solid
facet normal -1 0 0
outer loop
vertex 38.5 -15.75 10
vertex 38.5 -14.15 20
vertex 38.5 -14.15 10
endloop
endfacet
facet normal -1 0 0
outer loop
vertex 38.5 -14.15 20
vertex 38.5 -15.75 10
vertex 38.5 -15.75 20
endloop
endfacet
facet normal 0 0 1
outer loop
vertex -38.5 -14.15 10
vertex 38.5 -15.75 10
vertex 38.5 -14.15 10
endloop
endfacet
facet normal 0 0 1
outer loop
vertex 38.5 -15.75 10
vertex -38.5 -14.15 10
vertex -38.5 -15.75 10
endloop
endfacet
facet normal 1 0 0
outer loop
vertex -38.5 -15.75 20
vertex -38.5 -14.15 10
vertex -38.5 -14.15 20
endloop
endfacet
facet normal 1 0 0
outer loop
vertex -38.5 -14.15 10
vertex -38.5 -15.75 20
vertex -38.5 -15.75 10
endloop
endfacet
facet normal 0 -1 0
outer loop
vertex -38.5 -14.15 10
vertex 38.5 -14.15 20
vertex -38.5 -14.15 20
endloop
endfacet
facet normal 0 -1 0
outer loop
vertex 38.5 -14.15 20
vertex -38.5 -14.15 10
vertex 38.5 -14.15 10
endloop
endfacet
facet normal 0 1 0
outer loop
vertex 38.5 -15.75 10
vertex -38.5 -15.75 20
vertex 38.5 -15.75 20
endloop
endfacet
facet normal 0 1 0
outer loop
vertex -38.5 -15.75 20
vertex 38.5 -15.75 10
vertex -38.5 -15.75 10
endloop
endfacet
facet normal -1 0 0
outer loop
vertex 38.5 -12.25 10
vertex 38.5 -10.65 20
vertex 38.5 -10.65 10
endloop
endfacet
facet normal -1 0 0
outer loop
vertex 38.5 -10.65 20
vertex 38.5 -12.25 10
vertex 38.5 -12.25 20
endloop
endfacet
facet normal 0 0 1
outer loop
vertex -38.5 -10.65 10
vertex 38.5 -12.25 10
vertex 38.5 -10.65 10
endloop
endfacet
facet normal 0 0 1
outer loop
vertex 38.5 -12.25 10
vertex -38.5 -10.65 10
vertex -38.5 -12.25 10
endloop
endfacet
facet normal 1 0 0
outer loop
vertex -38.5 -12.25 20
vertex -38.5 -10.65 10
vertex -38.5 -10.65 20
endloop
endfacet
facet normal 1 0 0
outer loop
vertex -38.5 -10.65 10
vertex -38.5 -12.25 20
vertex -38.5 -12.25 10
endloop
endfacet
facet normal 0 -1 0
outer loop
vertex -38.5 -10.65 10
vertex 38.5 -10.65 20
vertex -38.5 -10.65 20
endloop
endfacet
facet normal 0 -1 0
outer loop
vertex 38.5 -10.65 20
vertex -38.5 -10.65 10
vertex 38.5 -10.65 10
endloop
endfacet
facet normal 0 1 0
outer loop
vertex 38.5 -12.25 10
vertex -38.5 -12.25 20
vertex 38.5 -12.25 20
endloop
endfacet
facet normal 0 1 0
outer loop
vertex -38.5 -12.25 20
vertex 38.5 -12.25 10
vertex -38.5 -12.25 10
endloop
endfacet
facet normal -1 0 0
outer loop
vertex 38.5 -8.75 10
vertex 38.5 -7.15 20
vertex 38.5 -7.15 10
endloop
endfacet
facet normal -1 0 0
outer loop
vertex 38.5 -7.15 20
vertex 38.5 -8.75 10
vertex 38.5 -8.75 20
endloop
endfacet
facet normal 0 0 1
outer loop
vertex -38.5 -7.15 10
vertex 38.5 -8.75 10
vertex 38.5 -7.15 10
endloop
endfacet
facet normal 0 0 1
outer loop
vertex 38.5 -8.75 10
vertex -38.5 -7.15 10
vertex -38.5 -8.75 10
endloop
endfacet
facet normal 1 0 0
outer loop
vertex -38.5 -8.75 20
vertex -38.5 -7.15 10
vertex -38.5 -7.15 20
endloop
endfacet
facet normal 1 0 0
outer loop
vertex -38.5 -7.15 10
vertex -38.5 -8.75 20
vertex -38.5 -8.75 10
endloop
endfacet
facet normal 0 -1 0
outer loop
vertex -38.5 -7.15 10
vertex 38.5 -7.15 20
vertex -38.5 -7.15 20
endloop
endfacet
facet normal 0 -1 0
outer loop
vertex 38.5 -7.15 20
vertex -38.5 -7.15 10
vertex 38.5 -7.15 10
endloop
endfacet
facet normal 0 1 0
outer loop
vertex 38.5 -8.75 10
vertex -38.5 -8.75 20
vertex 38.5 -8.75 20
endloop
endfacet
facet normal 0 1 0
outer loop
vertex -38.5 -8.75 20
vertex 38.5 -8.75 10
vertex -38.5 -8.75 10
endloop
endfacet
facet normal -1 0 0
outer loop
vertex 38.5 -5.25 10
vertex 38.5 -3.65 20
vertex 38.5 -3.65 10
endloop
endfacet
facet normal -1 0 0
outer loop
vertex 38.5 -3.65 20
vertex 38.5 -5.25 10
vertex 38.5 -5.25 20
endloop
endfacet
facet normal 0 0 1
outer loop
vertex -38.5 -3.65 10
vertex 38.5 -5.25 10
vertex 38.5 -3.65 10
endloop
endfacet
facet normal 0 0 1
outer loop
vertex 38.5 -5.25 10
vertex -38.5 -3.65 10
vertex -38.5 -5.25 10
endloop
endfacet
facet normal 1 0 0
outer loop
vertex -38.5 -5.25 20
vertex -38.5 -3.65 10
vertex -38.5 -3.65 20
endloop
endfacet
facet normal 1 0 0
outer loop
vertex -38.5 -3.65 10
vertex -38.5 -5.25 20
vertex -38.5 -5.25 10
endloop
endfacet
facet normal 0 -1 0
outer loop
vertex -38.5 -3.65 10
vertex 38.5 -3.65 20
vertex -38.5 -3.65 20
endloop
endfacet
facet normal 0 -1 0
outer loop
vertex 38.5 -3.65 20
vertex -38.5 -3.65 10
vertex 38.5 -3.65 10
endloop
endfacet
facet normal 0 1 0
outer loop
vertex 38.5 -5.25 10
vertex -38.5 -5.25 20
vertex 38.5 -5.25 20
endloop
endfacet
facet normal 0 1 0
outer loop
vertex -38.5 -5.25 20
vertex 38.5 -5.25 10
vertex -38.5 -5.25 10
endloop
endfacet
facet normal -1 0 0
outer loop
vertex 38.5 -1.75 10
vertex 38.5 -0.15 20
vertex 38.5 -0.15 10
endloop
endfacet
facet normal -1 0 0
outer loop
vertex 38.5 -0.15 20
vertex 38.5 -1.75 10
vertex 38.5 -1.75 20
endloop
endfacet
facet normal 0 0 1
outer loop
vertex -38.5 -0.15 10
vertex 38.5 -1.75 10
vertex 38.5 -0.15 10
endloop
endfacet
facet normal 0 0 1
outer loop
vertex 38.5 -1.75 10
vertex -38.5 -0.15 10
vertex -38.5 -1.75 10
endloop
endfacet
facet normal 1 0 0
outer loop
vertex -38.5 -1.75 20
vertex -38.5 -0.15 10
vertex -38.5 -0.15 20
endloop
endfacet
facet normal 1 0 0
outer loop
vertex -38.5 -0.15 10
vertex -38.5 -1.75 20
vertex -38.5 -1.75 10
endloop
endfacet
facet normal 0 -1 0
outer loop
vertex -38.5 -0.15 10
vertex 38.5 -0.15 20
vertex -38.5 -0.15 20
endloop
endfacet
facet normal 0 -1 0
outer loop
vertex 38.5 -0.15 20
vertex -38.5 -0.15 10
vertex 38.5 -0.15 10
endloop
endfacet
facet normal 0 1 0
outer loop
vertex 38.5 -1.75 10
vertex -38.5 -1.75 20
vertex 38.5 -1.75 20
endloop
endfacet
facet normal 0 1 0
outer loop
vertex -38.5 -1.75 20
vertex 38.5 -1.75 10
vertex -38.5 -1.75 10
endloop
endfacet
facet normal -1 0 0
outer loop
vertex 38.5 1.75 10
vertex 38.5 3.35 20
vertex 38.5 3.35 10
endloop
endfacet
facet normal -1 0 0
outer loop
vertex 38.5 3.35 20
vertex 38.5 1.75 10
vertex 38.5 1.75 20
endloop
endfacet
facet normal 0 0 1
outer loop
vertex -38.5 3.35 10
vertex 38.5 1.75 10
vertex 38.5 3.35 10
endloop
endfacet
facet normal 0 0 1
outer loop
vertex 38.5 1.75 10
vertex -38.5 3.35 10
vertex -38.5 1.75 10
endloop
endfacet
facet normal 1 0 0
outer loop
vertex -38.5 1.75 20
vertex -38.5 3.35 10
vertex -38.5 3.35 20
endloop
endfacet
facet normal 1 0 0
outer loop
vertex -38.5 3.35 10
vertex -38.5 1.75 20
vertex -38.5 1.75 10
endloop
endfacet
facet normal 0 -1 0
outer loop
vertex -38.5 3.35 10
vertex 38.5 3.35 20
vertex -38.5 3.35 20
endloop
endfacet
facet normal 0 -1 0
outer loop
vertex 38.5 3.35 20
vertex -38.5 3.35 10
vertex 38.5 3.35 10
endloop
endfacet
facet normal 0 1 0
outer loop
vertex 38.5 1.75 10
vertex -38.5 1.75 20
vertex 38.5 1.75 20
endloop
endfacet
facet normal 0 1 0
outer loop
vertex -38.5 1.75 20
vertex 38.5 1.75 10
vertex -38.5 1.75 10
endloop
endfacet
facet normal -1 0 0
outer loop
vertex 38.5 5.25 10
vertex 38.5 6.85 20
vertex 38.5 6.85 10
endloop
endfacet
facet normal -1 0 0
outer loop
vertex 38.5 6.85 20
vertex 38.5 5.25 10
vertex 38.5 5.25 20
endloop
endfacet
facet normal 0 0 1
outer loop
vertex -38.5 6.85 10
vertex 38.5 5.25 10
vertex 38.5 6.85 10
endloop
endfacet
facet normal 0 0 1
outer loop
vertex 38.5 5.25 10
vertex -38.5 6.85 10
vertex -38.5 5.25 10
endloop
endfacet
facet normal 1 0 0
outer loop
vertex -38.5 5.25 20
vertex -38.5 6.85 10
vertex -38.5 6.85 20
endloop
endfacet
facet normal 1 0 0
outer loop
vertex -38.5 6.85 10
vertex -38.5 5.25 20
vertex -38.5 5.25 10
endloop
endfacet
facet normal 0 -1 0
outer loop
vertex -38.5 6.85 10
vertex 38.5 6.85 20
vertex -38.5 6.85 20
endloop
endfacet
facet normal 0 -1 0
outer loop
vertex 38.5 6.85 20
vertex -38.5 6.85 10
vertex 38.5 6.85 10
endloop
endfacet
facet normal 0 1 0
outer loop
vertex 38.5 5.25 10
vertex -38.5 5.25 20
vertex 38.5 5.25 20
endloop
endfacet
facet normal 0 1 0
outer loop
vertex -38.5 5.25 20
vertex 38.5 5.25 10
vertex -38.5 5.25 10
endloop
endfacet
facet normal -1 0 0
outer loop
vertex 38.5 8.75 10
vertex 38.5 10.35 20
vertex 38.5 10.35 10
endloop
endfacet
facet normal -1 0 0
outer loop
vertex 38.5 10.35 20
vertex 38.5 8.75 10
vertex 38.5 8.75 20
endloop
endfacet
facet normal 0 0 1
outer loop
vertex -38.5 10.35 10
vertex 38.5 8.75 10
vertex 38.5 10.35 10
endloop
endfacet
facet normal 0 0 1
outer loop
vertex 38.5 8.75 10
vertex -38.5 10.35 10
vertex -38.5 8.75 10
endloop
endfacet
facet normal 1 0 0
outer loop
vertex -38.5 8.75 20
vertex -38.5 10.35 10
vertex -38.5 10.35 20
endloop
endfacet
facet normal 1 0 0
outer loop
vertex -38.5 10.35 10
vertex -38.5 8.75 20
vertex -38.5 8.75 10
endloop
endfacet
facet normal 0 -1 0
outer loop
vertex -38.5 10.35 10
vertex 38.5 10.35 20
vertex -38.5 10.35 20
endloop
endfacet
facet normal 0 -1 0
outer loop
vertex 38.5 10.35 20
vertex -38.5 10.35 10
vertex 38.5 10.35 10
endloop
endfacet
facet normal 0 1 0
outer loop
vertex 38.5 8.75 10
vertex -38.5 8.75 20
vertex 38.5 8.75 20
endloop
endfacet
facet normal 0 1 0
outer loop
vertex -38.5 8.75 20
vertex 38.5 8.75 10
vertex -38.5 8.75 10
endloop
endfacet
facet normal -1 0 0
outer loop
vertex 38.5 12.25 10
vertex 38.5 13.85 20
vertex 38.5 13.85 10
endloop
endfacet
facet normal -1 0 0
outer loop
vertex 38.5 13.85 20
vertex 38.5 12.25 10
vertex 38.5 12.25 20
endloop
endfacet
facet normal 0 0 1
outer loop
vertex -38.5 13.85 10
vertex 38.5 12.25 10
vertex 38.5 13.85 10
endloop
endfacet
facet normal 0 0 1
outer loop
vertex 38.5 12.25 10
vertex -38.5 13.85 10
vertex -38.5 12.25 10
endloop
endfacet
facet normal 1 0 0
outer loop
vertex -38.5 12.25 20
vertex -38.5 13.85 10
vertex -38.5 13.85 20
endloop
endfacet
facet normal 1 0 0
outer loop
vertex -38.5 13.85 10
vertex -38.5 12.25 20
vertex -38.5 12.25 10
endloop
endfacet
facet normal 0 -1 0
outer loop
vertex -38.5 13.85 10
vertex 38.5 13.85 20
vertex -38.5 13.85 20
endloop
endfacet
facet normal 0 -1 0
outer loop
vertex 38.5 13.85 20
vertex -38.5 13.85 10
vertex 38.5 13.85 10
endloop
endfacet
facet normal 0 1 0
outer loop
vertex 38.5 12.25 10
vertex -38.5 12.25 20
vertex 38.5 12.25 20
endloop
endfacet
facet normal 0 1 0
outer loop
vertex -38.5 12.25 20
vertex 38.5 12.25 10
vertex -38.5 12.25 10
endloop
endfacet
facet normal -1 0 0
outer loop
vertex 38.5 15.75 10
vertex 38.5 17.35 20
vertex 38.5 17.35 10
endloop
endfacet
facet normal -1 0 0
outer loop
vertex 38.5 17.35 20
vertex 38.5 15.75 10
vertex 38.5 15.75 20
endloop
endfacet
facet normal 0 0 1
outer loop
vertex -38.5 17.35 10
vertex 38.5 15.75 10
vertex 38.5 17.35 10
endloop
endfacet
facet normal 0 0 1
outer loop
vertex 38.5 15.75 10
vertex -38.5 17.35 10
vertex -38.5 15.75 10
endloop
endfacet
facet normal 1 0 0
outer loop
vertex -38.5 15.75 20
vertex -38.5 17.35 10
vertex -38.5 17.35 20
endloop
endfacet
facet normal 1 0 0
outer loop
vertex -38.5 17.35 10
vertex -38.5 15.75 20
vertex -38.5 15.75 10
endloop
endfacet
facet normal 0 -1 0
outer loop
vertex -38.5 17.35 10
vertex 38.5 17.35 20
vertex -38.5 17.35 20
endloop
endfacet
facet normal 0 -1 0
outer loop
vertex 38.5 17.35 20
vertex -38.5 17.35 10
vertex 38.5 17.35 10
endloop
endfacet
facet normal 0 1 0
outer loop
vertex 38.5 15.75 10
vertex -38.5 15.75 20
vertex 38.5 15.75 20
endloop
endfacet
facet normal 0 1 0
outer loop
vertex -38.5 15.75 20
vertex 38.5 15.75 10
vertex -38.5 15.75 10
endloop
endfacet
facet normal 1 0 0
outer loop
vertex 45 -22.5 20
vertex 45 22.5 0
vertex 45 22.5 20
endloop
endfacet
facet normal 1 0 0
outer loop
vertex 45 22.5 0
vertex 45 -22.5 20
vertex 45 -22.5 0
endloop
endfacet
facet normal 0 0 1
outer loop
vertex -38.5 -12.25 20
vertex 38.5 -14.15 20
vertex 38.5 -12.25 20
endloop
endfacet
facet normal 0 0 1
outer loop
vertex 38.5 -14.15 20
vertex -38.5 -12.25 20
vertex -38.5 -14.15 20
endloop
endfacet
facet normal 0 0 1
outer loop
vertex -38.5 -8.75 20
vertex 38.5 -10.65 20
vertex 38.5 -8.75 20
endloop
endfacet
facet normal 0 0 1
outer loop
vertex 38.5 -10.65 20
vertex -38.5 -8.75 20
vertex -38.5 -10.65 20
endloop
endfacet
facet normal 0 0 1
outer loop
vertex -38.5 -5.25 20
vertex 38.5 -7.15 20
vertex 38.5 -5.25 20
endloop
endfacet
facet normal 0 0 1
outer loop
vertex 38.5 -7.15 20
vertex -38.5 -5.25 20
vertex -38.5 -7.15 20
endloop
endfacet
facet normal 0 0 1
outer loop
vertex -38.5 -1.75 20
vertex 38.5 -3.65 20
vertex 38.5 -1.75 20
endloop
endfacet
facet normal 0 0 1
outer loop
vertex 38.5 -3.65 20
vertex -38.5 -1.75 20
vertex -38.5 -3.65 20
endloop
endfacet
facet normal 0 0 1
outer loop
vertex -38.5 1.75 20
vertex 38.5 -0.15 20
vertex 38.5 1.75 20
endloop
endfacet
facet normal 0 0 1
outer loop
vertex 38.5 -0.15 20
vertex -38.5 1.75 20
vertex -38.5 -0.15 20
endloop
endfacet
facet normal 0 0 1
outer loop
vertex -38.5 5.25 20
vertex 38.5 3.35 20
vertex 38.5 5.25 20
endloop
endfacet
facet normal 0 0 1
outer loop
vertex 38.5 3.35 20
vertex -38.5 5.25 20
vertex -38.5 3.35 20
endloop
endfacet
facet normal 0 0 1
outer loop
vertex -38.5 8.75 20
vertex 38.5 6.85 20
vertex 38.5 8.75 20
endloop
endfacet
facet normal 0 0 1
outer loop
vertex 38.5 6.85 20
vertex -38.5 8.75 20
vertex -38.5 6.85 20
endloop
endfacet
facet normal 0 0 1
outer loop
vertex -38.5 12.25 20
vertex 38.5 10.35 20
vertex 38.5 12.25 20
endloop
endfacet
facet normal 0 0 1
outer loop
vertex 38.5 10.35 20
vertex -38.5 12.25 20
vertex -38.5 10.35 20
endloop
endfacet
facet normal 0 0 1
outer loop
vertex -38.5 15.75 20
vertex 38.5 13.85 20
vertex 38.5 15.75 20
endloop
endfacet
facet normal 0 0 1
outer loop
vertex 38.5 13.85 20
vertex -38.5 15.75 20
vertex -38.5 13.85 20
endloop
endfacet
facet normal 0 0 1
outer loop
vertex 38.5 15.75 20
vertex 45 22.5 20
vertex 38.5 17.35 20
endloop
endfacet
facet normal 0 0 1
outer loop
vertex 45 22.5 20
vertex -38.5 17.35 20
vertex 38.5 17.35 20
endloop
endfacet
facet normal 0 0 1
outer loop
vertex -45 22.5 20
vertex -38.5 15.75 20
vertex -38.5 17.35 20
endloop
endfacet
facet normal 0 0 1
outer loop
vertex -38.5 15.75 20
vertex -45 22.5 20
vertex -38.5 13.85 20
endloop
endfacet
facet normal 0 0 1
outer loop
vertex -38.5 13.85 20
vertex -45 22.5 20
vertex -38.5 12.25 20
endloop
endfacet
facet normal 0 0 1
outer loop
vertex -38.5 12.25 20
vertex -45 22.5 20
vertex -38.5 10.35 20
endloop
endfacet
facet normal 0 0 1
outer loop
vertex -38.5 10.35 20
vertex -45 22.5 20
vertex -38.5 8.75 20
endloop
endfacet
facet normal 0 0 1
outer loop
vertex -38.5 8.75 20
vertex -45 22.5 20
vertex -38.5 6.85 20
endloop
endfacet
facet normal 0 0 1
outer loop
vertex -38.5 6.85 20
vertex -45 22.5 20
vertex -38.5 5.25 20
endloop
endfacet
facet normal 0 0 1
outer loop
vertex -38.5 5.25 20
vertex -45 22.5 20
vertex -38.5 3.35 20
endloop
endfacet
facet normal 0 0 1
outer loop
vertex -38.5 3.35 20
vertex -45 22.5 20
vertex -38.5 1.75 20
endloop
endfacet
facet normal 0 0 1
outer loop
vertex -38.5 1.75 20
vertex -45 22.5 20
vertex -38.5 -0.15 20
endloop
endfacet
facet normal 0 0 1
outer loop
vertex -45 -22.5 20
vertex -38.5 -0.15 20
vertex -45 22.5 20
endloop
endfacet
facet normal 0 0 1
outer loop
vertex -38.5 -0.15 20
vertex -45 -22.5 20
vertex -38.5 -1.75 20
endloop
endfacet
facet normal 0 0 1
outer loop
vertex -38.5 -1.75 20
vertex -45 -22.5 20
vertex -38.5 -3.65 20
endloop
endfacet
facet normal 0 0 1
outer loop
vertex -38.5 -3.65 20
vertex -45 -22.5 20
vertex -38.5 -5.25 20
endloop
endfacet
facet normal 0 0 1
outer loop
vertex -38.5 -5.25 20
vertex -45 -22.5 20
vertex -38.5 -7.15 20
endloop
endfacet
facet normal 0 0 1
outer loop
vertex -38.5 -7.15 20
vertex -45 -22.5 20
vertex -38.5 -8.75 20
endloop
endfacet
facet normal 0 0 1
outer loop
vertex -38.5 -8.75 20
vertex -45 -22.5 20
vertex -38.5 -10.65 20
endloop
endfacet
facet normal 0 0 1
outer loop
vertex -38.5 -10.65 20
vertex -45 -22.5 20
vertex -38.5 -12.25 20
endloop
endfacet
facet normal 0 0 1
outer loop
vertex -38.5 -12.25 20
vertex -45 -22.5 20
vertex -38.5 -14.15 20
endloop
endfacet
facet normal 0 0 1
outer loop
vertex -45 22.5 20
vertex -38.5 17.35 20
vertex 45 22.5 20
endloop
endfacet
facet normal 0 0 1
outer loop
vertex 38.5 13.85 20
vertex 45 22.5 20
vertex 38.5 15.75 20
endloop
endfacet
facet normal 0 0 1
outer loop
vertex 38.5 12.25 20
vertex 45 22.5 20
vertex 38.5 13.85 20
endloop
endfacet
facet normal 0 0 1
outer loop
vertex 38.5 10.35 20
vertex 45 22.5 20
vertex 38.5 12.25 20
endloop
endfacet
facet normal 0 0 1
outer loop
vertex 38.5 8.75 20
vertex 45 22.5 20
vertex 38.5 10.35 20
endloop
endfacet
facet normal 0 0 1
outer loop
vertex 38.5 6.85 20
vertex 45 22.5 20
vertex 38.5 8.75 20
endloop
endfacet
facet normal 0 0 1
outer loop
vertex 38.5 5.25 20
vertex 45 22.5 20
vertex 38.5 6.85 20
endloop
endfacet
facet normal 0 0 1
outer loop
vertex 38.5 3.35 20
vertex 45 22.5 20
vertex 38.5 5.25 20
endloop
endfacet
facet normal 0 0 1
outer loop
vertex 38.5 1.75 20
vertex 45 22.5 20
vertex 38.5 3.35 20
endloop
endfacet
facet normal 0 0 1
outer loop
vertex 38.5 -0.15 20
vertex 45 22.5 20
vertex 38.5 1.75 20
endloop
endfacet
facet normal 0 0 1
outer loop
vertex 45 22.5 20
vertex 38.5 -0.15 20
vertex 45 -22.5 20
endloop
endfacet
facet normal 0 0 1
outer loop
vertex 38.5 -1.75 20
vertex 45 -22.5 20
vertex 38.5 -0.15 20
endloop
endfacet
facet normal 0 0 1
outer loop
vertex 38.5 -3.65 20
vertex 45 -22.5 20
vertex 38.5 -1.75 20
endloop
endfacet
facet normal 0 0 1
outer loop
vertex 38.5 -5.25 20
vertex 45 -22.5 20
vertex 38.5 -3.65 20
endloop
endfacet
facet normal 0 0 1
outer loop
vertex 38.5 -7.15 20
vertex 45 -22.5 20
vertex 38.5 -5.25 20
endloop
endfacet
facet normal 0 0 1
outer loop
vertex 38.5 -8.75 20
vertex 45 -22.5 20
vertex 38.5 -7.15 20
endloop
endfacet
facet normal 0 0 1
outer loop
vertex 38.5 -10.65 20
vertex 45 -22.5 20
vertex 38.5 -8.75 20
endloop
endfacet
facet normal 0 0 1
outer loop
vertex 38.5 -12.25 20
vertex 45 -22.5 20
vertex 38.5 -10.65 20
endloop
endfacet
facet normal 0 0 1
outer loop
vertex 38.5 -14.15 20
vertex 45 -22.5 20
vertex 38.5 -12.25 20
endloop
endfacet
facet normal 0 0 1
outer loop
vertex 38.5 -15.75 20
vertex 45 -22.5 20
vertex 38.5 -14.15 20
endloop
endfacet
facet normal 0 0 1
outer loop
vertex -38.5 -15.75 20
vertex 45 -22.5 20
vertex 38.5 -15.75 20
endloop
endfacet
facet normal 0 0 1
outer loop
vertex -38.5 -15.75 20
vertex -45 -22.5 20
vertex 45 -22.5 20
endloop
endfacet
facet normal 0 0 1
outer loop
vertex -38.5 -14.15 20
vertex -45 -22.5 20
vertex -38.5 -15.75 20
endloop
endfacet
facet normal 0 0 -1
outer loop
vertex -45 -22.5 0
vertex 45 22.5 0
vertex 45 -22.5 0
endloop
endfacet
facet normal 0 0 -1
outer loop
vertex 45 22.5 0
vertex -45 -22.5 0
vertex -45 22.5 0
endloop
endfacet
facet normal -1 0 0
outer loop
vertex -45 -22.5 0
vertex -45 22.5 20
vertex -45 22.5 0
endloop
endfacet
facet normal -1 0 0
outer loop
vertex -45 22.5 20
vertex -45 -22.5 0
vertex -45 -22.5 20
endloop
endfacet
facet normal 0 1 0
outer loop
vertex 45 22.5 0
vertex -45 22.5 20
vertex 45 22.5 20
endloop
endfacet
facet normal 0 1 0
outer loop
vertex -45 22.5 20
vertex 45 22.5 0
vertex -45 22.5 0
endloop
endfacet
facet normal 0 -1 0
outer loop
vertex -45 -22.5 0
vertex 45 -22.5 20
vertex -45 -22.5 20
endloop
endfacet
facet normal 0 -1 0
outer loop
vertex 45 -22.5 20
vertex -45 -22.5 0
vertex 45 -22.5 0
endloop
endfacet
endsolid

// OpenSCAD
// Sliding rack for 10 microscope slides, standing on their long edge
// Print orientation: base block rests on XY plane, slots open upward (+Z)

// ---------------- Parameters ----------------
n_slots      = 10;    // number of slide slots
slot_len     = 77;    // slot length along X (mm)
slot_w       = 1.6;   // slot width along Y (mm)
slot_depth   = 10;    // slot depth into block along Z (mm)
slot_pitch   = 3.5;   // centre-to-centre spacing of slots along Y (mm)

block_len    = 90;    // base block length along X (mm)
block_w      = 45;    // base block width along Y (mm)
block_h      = 20;    // base block height along Z (mm)

eps          = 0.5;   // overcut so cutting faces are not coplanar (mm)

$fn = 64;

// ---------------- Model ----------------
difference() {
    // Base block, centred in X and Y, sitting on z = 0
    translate([-block_len/2, -block_w/2, 0])
        cube([block_len, block_w, block_h]);

    // Row of parallel slots, centred on the block in X and Y
    for (i = [0 : n_slots - 1]) {
        y_c = (i - (n_slots - 1)/2) * slot_pitch;
        translate([-slot_len/2, y_c, block_h - slot_depth])
            cube([slot_len, slot_w, slot_depth + eps]);
    }
}
